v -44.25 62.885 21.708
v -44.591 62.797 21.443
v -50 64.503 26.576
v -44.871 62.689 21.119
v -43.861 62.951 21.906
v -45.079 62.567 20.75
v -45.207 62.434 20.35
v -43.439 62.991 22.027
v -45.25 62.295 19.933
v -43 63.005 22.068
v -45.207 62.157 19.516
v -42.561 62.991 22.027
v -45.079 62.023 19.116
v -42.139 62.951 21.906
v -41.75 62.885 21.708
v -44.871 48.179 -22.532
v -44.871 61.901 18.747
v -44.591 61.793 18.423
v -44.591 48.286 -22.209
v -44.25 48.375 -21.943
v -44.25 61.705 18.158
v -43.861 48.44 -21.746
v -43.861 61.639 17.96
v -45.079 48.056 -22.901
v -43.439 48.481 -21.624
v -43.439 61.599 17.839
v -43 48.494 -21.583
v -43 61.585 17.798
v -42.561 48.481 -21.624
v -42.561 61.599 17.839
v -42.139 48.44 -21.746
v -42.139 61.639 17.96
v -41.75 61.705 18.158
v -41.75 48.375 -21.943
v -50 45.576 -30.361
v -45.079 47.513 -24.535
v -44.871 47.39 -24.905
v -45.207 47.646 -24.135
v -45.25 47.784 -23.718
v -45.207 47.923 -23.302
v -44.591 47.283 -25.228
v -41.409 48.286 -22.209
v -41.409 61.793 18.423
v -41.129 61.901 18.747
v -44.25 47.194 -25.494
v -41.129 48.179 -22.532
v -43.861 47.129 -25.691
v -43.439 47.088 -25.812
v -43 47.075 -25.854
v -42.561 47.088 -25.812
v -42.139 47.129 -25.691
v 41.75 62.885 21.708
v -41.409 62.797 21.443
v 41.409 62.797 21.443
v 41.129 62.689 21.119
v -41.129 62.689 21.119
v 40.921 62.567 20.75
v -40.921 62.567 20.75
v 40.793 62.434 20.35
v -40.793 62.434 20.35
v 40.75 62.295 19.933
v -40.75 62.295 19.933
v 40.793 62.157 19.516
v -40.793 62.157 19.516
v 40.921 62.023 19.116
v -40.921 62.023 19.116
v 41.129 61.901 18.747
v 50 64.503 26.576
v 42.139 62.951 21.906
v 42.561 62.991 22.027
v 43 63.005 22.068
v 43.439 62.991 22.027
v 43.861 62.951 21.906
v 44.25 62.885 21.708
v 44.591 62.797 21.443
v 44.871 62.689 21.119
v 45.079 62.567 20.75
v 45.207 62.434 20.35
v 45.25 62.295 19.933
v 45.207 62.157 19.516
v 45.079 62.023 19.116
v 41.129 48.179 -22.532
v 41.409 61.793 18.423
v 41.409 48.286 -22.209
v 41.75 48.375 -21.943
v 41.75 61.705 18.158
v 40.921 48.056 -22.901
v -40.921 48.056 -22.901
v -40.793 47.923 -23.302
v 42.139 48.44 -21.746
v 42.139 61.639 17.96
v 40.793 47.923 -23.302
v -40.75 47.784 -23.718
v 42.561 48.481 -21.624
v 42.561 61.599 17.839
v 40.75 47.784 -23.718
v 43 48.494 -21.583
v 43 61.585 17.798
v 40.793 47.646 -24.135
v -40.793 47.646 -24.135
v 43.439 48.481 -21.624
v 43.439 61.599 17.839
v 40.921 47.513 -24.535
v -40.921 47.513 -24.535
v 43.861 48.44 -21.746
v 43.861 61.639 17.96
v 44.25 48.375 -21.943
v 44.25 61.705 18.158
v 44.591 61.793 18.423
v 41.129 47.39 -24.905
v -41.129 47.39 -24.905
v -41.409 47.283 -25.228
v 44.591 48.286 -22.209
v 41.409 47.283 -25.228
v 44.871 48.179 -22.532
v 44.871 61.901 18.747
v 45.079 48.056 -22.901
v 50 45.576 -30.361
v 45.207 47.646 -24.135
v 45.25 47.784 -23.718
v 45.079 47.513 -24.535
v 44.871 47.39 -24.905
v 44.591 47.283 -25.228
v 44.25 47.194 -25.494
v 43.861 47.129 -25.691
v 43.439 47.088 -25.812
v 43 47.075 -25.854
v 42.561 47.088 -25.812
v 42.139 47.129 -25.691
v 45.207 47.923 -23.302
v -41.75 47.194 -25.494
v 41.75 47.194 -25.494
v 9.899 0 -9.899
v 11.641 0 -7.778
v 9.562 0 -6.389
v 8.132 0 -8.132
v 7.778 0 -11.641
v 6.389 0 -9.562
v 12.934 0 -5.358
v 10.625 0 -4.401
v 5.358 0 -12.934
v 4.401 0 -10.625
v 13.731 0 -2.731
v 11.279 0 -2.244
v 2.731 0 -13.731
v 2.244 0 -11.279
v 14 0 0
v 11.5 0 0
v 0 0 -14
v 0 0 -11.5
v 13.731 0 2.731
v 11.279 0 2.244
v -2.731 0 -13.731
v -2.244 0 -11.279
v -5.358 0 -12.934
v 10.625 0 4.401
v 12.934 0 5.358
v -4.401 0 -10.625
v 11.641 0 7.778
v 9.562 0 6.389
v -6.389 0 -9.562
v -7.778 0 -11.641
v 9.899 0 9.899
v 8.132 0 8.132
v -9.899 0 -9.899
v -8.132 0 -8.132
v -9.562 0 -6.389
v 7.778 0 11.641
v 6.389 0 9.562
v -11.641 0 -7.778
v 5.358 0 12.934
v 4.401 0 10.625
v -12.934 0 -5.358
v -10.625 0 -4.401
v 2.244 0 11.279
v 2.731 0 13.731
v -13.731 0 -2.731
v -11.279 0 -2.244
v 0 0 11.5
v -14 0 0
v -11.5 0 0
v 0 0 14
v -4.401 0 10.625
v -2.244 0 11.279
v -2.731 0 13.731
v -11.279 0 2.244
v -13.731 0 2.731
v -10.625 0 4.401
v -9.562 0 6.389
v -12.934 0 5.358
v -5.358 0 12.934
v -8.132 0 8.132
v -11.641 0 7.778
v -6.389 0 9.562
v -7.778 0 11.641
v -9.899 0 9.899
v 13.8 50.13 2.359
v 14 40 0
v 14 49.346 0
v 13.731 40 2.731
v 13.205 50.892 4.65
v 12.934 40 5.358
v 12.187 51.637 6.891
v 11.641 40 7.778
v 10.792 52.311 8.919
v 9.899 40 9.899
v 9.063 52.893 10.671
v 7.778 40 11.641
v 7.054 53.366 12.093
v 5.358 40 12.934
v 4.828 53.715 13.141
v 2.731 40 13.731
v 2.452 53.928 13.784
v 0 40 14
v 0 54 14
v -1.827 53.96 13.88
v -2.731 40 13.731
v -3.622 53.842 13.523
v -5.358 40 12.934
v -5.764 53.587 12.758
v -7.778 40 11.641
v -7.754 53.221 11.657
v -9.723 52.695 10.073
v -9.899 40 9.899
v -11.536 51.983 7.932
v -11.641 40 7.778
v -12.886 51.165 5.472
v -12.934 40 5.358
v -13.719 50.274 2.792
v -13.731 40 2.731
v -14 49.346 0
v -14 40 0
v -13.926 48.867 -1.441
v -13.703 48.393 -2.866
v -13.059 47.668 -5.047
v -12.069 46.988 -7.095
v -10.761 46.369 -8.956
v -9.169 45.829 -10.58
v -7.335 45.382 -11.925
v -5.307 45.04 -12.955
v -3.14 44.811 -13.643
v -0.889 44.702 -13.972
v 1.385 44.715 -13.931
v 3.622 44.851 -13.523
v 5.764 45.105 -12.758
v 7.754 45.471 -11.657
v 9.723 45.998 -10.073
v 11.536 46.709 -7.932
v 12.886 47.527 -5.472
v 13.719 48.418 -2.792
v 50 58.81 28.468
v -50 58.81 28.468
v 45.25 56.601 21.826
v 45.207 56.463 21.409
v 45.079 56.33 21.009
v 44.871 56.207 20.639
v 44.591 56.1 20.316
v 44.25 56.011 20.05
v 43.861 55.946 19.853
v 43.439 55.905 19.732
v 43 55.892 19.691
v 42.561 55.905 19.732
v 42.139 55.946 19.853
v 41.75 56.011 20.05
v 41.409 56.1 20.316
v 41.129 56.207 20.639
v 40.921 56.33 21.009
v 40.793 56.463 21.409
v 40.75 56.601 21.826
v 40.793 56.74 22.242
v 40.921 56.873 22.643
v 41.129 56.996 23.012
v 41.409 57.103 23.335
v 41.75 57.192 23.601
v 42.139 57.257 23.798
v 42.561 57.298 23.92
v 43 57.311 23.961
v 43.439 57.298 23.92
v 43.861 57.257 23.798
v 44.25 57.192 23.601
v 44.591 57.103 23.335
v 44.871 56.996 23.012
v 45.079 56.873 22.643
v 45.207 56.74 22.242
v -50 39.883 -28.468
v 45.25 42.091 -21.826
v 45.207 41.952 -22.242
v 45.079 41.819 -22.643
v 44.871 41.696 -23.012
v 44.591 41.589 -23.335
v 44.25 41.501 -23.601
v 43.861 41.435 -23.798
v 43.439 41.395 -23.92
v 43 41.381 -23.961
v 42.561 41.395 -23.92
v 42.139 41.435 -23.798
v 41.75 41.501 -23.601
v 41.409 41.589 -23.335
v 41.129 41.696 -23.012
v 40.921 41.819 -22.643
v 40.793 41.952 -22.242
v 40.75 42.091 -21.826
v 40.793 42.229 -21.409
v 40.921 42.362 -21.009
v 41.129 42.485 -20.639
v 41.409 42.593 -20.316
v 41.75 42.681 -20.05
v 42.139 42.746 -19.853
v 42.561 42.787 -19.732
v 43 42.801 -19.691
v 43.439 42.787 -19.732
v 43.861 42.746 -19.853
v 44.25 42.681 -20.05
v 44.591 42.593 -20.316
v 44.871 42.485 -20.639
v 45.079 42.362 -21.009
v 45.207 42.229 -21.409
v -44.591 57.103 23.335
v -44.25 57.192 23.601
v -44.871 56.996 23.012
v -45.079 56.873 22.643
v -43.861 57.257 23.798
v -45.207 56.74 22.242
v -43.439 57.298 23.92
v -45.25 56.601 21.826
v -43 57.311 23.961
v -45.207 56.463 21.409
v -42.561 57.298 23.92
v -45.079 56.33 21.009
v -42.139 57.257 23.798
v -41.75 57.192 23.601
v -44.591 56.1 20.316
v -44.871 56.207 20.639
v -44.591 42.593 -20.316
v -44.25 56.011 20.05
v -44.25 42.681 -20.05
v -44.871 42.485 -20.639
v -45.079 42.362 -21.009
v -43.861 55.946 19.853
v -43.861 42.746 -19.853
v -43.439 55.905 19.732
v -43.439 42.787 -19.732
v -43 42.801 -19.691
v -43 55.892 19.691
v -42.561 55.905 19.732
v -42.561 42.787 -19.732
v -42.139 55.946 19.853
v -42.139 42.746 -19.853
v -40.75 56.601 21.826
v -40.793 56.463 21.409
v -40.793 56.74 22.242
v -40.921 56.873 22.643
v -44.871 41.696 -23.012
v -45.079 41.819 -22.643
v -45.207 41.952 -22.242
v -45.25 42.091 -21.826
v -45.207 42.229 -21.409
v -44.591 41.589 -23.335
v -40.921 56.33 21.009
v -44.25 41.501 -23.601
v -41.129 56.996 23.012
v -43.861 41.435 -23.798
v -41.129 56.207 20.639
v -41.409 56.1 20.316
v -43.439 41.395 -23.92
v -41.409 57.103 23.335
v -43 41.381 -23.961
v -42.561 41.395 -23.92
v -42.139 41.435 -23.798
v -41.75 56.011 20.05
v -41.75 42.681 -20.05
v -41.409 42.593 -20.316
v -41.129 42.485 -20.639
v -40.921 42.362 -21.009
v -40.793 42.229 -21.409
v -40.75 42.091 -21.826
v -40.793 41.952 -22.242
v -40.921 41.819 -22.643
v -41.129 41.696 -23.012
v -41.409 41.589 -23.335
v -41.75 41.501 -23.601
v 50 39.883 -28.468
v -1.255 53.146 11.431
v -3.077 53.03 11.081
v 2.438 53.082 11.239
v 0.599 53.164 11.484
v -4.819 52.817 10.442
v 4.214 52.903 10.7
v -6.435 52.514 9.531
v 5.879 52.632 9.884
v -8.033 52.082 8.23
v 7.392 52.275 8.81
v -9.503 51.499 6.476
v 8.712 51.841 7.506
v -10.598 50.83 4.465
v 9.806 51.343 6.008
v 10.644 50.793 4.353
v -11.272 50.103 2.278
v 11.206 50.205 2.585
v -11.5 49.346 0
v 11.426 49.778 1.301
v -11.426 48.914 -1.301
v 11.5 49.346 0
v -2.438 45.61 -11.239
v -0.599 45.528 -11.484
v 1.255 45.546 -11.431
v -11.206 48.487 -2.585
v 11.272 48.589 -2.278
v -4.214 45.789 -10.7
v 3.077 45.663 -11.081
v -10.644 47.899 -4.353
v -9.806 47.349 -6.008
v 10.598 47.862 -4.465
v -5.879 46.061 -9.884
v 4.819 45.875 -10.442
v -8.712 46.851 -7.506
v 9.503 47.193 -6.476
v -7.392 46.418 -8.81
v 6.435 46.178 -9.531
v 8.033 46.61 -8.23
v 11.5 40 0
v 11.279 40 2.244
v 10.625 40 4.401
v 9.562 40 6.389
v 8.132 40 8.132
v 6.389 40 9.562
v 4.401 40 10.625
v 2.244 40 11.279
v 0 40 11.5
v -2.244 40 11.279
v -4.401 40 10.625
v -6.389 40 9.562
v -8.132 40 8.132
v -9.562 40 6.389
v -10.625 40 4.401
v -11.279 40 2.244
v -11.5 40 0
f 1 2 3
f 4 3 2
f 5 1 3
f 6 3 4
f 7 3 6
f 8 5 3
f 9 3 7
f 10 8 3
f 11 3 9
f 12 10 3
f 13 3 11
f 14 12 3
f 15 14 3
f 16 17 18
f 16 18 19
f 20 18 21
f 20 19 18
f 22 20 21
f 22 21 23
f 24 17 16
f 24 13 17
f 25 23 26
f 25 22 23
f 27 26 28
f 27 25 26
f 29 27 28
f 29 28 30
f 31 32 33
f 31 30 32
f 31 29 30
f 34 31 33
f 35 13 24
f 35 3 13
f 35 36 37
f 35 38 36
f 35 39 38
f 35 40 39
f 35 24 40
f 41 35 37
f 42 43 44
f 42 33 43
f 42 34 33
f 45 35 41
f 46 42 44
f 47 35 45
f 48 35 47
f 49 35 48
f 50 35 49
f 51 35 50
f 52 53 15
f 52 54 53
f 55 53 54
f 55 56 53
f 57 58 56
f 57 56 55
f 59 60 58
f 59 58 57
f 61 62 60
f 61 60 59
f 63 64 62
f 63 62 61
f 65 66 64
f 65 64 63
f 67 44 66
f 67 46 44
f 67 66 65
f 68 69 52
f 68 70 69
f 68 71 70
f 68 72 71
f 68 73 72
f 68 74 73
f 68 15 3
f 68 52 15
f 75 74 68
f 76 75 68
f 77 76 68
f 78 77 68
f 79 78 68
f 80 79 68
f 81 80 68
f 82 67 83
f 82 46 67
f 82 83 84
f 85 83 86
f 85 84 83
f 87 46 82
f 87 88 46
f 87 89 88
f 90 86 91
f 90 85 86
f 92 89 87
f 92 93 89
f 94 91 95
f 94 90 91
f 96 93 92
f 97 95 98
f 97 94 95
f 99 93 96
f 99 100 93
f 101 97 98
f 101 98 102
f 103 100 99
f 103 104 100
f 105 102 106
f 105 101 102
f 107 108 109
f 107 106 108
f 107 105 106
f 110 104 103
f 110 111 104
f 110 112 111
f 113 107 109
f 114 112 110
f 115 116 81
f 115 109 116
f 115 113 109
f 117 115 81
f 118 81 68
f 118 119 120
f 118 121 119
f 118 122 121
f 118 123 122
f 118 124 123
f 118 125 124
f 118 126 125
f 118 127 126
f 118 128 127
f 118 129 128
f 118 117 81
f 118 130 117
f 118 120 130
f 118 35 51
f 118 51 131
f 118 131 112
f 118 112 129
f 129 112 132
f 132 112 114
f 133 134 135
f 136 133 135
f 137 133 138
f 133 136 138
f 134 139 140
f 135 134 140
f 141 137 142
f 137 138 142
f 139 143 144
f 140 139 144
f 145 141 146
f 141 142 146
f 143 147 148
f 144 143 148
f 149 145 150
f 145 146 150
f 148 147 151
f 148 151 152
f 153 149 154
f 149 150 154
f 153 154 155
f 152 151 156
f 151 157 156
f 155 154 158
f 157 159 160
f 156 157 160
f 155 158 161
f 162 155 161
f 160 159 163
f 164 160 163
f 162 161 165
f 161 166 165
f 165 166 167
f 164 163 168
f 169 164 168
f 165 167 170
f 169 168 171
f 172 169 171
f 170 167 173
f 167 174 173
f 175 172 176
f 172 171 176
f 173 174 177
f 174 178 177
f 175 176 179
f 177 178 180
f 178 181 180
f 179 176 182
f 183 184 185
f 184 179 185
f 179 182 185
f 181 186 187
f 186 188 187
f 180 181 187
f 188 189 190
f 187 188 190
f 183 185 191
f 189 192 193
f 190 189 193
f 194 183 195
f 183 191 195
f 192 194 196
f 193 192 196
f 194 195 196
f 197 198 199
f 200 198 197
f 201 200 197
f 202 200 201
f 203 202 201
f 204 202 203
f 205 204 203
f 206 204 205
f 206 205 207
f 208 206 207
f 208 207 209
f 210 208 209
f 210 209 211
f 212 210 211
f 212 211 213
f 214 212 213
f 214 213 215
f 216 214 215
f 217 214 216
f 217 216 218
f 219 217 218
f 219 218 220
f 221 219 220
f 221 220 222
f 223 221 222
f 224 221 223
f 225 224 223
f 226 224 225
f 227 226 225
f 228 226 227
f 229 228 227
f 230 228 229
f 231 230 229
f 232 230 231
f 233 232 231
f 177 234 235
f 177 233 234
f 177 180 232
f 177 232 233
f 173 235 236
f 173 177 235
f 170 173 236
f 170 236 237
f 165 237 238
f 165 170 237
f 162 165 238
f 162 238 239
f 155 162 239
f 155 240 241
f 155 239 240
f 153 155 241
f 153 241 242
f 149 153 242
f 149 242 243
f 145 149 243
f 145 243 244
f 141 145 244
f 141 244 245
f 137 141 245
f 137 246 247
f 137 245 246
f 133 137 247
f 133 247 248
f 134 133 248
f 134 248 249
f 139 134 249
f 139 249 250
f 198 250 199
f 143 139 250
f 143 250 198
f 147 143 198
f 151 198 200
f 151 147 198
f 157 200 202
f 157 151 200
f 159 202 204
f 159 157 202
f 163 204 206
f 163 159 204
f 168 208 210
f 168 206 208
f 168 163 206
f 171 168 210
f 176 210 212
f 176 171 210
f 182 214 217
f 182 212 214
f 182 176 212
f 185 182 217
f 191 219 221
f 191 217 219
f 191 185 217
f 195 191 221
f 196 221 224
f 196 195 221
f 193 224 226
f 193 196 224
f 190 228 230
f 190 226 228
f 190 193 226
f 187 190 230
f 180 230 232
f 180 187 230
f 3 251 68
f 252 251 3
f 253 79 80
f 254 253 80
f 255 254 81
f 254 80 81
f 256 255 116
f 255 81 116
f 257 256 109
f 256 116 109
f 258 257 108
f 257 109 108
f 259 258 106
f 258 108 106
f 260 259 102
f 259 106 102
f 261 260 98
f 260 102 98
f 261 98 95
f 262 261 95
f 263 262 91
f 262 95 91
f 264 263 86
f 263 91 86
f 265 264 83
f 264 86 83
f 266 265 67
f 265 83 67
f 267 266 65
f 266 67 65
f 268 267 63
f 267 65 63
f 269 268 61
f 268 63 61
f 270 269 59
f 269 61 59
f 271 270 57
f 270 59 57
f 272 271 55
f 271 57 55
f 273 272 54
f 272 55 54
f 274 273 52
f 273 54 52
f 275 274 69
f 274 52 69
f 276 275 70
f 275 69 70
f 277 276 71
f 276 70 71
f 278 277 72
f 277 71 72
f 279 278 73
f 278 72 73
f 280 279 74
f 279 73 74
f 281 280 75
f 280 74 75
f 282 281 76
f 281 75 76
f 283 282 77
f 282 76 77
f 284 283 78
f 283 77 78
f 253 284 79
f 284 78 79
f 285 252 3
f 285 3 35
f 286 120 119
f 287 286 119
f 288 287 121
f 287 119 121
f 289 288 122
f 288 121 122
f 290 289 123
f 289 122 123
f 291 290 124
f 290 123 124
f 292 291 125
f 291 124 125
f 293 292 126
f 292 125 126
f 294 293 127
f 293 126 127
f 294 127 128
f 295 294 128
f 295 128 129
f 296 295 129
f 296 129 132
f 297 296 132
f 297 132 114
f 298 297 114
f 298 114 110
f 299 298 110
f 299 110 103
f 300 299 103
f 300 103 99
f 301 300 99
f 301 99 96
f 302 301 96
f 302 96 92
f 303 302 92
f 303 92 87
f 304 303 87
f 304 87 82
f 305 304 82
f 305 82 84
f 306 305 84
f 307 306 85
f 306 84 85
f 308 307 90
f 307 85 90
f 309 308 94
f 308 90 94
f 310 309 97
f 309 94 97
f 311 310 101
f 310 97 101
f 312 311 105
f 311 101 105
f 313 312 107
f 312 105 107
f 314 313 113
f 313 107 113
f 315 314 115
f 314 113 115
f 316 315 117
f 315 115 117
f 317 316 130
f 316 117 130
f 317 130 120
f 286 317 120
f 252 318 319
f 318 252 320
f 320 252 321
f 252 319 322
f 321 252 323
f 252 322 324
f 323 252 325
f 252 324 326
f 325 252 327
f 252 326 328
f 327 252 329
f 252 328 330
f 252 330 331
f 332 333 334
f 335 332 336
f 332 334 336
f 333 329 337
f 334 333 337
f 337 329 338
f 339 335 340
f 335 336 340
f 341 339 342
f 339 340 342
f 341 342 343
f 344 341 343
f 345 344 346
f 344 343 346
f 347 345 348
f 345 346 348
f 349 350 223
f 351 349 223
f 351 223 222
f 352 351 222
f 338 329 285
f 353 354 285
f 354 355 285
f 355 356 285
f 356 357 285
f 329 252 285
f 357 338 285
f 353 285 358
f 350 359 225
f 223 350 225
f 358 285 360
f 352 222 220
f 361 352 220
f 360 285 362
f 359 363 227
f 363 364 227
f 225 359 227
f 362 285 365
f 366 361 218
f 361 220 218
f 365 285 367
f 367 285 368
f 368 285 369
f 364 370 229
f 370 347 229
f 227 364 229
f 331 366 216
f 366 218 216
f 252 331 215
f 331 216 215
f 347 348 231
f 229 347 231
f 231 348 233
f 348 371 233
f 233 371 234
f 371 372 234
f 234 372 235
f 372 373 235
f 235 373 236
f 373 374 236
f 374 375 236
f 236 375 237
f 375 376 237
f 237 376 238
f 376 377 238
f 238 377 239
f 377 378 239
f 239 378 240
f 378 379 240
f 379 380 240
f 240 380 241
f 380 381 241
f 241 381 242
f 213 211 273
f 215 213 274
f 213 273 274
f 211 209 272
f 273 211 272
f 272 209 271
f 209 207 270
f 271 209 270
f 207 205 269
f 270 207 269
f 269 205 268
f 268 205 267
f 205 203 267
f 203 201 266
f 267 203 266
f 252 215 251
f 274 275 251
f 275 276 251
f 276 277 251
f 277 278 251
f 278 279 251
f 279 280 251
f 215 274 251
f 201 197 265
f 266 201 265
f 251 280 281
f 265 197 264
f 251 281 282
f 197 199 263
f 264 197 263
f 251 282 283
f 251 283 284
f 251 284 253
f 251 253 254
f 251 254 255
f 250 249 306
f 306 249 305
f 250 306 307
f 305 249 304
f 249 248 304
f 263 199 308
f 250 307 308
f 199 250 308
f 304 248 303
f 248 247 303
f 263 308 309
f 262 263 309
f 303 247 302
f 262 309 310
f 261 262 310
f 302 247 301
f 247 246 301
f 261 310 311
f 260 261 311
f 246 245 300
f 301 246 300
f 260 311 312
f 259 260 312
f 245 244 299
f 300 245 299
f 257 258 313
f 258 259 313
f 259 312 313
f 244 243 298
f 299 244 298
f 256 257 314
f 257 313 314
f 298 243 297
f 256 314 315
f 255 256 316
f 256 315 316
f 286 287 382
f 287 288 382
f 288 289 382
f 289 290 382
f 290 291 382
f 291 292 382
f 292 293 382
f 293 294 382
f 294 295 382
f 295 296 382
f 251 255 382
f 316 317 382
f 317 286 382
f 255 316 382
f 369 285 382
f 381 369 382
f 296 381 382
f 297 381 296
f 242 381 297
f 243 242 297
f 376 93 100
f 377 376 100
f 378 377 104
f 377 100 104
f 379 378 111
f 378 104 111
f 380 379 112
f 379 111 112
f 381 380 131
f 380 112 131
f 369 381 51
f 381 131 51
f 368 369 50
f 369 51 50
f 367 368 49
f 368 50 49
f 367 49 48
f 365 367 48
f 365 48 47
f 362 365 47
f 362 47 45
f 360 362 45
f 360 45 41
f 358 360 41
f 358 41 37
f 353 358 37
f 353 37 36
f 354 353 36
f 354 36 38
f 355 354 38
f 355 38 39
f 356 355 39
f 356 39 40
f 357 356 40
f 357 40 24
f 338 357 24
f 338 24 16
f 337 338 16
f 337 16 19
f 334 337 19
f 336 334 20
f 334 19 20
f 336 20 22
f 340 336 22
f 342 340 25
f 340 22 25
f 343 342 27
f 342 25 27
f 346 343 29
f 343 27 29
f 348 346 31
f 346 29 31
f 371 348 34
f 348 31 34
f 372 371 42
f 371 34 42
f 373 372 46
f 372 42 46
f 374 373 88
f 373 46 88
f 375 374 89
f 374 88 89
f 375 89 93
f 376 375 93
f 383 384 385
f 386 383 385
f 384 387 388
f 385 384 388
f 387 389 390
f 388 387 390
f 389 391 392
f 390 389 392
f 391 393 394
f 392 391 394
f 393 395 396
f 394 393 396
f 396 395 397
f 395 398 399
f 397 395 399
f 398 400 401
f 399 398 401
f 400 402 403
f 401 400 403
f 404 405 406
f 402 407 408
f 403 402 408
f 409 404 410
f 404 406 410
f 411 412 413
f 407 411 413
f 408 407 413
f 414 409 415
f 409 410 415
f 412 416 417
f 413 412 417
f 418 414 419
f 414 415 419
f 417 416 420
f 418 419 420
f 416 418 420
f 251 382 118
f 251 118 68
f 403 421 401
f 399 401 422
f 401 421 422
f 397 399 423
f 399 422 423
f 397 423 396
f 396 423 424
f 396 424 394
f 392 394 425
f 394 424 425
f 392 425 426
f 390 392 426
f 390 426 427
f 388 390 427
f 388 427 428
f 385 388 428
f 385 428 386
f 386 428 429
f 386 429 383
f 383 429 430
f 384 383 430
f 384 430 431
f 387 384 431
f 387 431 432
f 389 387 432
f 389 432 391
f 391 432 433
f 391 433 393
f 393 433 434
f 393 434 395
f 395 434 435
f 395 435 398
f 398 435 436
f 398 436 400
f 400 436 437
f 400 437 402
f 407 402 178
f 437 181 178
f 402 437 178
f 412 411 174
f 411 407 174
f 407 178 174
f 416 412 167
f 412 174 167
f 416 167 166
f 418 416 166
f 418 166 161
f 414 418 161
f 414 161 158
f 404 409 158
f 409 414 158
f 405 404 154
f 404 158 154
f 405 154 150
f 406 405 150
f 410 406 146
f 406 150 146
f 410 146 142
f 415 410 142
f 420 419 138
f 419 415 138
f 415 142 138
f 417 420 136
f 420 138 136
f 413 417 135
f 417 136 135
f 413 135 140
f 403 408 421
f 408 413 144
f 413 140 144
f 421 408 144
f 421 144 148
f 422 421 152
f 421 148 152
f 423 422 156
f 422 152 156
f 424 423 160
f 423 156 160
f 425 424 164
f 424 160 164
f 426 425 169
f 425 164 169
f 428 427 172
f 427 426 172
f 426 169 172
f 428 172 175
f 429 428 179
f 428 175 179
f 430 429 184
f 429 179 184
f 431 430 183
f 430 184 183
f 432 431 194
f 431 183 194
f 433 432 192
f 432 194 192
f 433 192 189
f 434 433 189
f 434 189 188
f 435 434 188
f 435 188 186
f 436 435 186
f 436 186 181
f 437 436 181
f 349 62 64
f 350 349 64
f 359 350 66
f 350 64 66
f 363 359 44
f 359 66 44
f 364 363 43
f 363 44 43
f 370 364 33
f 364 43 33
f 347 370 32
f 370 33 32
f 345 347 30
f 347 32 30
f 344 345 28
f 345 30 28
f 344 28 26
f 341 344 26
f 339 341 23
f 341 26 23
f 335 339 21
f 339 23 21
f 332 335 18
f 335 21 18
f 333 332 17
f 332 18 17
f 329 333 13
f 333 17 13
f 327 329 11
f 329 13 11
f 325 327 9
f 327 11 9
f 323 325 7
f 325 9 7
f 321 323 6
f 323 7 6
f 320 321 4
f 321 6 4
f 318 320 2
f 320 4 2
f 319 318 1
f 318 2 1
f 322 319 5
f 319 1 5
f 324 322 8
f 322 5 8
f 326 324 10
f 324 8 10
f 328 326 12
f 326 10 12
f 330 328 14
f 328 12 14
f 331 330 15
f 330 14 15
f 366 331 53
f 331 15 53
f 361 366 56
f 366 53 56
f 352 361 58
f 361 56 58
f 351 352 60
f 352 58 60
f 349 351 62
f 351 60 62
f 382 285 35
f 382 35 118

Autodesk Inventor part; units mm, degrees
ref_plane "YZ Plane" through (0, 0, 0) normal (1, 0, 0) x (0, 1, 0)
ref_plane "XZ Plane" through (0, 0, 0) normal (0, 1, 0) x (-1, 0, 0)
ref_plane "XY Plane" through (0, 0, 0) normal (0, 0, 1) x (1, 0, 0)
sketch "Эскиз1" plane through (0, 0, 0) normal (0, 1, 0) x (-1, 0, 0)
  circle A0 centre (0, 0) radius 11.5
  circle A1 centre (0, 0) radius 14
  dimension "d0" = 23
  dimension "d1" = 28
extrude "Выдавливание1" add sketch "Эскиз1" along normal blind 40
sketch "Эскиз6" plane through (0, 40, 0) normal (0, 1, 0) x (1, 0, 0)
  circle A0 centre (0, 0) radius 14
  circle A1 centre (0, 0) radius 11.5 projected
  circle A2 centre (0, 0) radius 12
  circle A3 centre (0, 0) radius 12
extrude "Выдавливание5" add sketch "Эскиз6" along normal blind 14 contours A0 | A2
ref_plane "РабПлоскость1" through (0, 54, 11.8651) normal (1, 0, 0) x (0, 0, -1)
sketch "Эскиз8" plane through (0, 54, 11.8651) normal (1, 0, 0) x (0, 0, -1)
  line L0 (25.8651, 0) -> (-2.1349, 0) projected
  point P0 (11.8651, -54)
sketch "Эскиз9" plane through (0, 54, 11.8651) normal (1, 0, 0) x (0, 0, -1)
  line L0 (25.8651, 0) -> (-2.1349, 0) projected
  line L1 (-2.1349, 0) -> (27.9474, -10)
  line L2 (27.9474, -10) -> (27.9474, 0)
  line L3 (25.8651, -54) -> (25.8651, 0) projected
  line L4 (27.9474, 0) -> (-2.1349, 0)
  line L5 (0.3651, 0) -> (23.3651, 0) projected
  point P0 (11.8651, -54)
  dimension "d30" = 10
extrude "Выдавливание7" cut sketch "Эскиз9" along normal mid plane 70
sketch "Эскиз10" plane through (0, 49.3461, 0) normal (0, 0.9489425, -0.3154492) x (1, 0, 0)
  line L0 (50, -30) -> (-50, -30)
  line L1 (-50, -30) -> (-50, 30)
  line L2 (-50, 30) -> (50, 30)
  line L3 (50, 30) -> (50, -30)
  line L4 (50, -30) -> (-50, 30) construction
  line L5 (-50, -30) -> (50, 30) construction
  point P0 (0, 15.5662)
  point P1 (0, 0)
  dimension "d33" = 100
  dimension "d34" = 60
extrude "Выдавливание8" add sketch "Эскиз10" along normal blind 6
sketch "Эскиз11" plane through (0, 55.0397, -1.8927) normal (0, 0.9489425, -0.3154492) x (1, 0, 0)
  circle A0 centre (-43, -23) radius 2.25
  line L0 (-50, 30) -> (-50, -30) projected
  line L1 (-50, -30) -> (50, -30) projected
  circle A1 centre (-43, 23) radius 2.25
  line L2 (50, 30) -> (-50, 30) projected
  circle A2 centre (43, -23) radius 2.25
  line L3 (50, -30) -> (50, 30) projected
  circle A3 centre (43, 23) radius 2.25
  point P0 (0, 15.5662)
  dimension "d37" = 4.5
  dimension "d38" = 7
  dimension "d39" = 7
  dimension "d40" = 4.5
  dimension "d41" = 7
  dimension "d42" = 7
  dimension "d43" = 4.5
  dimension "d44" = 7
  dimension "d45" = 7
  dimension "d46" = 4.5
  dimension "d47" = 7
  dimension "d48" = 7
extrude "Выдавливание9" cut sketch "Эскиз11" against normal blind 6 contours A0 | A1 | A2 | A3
properties part number "подставка для драйвер хаба"
